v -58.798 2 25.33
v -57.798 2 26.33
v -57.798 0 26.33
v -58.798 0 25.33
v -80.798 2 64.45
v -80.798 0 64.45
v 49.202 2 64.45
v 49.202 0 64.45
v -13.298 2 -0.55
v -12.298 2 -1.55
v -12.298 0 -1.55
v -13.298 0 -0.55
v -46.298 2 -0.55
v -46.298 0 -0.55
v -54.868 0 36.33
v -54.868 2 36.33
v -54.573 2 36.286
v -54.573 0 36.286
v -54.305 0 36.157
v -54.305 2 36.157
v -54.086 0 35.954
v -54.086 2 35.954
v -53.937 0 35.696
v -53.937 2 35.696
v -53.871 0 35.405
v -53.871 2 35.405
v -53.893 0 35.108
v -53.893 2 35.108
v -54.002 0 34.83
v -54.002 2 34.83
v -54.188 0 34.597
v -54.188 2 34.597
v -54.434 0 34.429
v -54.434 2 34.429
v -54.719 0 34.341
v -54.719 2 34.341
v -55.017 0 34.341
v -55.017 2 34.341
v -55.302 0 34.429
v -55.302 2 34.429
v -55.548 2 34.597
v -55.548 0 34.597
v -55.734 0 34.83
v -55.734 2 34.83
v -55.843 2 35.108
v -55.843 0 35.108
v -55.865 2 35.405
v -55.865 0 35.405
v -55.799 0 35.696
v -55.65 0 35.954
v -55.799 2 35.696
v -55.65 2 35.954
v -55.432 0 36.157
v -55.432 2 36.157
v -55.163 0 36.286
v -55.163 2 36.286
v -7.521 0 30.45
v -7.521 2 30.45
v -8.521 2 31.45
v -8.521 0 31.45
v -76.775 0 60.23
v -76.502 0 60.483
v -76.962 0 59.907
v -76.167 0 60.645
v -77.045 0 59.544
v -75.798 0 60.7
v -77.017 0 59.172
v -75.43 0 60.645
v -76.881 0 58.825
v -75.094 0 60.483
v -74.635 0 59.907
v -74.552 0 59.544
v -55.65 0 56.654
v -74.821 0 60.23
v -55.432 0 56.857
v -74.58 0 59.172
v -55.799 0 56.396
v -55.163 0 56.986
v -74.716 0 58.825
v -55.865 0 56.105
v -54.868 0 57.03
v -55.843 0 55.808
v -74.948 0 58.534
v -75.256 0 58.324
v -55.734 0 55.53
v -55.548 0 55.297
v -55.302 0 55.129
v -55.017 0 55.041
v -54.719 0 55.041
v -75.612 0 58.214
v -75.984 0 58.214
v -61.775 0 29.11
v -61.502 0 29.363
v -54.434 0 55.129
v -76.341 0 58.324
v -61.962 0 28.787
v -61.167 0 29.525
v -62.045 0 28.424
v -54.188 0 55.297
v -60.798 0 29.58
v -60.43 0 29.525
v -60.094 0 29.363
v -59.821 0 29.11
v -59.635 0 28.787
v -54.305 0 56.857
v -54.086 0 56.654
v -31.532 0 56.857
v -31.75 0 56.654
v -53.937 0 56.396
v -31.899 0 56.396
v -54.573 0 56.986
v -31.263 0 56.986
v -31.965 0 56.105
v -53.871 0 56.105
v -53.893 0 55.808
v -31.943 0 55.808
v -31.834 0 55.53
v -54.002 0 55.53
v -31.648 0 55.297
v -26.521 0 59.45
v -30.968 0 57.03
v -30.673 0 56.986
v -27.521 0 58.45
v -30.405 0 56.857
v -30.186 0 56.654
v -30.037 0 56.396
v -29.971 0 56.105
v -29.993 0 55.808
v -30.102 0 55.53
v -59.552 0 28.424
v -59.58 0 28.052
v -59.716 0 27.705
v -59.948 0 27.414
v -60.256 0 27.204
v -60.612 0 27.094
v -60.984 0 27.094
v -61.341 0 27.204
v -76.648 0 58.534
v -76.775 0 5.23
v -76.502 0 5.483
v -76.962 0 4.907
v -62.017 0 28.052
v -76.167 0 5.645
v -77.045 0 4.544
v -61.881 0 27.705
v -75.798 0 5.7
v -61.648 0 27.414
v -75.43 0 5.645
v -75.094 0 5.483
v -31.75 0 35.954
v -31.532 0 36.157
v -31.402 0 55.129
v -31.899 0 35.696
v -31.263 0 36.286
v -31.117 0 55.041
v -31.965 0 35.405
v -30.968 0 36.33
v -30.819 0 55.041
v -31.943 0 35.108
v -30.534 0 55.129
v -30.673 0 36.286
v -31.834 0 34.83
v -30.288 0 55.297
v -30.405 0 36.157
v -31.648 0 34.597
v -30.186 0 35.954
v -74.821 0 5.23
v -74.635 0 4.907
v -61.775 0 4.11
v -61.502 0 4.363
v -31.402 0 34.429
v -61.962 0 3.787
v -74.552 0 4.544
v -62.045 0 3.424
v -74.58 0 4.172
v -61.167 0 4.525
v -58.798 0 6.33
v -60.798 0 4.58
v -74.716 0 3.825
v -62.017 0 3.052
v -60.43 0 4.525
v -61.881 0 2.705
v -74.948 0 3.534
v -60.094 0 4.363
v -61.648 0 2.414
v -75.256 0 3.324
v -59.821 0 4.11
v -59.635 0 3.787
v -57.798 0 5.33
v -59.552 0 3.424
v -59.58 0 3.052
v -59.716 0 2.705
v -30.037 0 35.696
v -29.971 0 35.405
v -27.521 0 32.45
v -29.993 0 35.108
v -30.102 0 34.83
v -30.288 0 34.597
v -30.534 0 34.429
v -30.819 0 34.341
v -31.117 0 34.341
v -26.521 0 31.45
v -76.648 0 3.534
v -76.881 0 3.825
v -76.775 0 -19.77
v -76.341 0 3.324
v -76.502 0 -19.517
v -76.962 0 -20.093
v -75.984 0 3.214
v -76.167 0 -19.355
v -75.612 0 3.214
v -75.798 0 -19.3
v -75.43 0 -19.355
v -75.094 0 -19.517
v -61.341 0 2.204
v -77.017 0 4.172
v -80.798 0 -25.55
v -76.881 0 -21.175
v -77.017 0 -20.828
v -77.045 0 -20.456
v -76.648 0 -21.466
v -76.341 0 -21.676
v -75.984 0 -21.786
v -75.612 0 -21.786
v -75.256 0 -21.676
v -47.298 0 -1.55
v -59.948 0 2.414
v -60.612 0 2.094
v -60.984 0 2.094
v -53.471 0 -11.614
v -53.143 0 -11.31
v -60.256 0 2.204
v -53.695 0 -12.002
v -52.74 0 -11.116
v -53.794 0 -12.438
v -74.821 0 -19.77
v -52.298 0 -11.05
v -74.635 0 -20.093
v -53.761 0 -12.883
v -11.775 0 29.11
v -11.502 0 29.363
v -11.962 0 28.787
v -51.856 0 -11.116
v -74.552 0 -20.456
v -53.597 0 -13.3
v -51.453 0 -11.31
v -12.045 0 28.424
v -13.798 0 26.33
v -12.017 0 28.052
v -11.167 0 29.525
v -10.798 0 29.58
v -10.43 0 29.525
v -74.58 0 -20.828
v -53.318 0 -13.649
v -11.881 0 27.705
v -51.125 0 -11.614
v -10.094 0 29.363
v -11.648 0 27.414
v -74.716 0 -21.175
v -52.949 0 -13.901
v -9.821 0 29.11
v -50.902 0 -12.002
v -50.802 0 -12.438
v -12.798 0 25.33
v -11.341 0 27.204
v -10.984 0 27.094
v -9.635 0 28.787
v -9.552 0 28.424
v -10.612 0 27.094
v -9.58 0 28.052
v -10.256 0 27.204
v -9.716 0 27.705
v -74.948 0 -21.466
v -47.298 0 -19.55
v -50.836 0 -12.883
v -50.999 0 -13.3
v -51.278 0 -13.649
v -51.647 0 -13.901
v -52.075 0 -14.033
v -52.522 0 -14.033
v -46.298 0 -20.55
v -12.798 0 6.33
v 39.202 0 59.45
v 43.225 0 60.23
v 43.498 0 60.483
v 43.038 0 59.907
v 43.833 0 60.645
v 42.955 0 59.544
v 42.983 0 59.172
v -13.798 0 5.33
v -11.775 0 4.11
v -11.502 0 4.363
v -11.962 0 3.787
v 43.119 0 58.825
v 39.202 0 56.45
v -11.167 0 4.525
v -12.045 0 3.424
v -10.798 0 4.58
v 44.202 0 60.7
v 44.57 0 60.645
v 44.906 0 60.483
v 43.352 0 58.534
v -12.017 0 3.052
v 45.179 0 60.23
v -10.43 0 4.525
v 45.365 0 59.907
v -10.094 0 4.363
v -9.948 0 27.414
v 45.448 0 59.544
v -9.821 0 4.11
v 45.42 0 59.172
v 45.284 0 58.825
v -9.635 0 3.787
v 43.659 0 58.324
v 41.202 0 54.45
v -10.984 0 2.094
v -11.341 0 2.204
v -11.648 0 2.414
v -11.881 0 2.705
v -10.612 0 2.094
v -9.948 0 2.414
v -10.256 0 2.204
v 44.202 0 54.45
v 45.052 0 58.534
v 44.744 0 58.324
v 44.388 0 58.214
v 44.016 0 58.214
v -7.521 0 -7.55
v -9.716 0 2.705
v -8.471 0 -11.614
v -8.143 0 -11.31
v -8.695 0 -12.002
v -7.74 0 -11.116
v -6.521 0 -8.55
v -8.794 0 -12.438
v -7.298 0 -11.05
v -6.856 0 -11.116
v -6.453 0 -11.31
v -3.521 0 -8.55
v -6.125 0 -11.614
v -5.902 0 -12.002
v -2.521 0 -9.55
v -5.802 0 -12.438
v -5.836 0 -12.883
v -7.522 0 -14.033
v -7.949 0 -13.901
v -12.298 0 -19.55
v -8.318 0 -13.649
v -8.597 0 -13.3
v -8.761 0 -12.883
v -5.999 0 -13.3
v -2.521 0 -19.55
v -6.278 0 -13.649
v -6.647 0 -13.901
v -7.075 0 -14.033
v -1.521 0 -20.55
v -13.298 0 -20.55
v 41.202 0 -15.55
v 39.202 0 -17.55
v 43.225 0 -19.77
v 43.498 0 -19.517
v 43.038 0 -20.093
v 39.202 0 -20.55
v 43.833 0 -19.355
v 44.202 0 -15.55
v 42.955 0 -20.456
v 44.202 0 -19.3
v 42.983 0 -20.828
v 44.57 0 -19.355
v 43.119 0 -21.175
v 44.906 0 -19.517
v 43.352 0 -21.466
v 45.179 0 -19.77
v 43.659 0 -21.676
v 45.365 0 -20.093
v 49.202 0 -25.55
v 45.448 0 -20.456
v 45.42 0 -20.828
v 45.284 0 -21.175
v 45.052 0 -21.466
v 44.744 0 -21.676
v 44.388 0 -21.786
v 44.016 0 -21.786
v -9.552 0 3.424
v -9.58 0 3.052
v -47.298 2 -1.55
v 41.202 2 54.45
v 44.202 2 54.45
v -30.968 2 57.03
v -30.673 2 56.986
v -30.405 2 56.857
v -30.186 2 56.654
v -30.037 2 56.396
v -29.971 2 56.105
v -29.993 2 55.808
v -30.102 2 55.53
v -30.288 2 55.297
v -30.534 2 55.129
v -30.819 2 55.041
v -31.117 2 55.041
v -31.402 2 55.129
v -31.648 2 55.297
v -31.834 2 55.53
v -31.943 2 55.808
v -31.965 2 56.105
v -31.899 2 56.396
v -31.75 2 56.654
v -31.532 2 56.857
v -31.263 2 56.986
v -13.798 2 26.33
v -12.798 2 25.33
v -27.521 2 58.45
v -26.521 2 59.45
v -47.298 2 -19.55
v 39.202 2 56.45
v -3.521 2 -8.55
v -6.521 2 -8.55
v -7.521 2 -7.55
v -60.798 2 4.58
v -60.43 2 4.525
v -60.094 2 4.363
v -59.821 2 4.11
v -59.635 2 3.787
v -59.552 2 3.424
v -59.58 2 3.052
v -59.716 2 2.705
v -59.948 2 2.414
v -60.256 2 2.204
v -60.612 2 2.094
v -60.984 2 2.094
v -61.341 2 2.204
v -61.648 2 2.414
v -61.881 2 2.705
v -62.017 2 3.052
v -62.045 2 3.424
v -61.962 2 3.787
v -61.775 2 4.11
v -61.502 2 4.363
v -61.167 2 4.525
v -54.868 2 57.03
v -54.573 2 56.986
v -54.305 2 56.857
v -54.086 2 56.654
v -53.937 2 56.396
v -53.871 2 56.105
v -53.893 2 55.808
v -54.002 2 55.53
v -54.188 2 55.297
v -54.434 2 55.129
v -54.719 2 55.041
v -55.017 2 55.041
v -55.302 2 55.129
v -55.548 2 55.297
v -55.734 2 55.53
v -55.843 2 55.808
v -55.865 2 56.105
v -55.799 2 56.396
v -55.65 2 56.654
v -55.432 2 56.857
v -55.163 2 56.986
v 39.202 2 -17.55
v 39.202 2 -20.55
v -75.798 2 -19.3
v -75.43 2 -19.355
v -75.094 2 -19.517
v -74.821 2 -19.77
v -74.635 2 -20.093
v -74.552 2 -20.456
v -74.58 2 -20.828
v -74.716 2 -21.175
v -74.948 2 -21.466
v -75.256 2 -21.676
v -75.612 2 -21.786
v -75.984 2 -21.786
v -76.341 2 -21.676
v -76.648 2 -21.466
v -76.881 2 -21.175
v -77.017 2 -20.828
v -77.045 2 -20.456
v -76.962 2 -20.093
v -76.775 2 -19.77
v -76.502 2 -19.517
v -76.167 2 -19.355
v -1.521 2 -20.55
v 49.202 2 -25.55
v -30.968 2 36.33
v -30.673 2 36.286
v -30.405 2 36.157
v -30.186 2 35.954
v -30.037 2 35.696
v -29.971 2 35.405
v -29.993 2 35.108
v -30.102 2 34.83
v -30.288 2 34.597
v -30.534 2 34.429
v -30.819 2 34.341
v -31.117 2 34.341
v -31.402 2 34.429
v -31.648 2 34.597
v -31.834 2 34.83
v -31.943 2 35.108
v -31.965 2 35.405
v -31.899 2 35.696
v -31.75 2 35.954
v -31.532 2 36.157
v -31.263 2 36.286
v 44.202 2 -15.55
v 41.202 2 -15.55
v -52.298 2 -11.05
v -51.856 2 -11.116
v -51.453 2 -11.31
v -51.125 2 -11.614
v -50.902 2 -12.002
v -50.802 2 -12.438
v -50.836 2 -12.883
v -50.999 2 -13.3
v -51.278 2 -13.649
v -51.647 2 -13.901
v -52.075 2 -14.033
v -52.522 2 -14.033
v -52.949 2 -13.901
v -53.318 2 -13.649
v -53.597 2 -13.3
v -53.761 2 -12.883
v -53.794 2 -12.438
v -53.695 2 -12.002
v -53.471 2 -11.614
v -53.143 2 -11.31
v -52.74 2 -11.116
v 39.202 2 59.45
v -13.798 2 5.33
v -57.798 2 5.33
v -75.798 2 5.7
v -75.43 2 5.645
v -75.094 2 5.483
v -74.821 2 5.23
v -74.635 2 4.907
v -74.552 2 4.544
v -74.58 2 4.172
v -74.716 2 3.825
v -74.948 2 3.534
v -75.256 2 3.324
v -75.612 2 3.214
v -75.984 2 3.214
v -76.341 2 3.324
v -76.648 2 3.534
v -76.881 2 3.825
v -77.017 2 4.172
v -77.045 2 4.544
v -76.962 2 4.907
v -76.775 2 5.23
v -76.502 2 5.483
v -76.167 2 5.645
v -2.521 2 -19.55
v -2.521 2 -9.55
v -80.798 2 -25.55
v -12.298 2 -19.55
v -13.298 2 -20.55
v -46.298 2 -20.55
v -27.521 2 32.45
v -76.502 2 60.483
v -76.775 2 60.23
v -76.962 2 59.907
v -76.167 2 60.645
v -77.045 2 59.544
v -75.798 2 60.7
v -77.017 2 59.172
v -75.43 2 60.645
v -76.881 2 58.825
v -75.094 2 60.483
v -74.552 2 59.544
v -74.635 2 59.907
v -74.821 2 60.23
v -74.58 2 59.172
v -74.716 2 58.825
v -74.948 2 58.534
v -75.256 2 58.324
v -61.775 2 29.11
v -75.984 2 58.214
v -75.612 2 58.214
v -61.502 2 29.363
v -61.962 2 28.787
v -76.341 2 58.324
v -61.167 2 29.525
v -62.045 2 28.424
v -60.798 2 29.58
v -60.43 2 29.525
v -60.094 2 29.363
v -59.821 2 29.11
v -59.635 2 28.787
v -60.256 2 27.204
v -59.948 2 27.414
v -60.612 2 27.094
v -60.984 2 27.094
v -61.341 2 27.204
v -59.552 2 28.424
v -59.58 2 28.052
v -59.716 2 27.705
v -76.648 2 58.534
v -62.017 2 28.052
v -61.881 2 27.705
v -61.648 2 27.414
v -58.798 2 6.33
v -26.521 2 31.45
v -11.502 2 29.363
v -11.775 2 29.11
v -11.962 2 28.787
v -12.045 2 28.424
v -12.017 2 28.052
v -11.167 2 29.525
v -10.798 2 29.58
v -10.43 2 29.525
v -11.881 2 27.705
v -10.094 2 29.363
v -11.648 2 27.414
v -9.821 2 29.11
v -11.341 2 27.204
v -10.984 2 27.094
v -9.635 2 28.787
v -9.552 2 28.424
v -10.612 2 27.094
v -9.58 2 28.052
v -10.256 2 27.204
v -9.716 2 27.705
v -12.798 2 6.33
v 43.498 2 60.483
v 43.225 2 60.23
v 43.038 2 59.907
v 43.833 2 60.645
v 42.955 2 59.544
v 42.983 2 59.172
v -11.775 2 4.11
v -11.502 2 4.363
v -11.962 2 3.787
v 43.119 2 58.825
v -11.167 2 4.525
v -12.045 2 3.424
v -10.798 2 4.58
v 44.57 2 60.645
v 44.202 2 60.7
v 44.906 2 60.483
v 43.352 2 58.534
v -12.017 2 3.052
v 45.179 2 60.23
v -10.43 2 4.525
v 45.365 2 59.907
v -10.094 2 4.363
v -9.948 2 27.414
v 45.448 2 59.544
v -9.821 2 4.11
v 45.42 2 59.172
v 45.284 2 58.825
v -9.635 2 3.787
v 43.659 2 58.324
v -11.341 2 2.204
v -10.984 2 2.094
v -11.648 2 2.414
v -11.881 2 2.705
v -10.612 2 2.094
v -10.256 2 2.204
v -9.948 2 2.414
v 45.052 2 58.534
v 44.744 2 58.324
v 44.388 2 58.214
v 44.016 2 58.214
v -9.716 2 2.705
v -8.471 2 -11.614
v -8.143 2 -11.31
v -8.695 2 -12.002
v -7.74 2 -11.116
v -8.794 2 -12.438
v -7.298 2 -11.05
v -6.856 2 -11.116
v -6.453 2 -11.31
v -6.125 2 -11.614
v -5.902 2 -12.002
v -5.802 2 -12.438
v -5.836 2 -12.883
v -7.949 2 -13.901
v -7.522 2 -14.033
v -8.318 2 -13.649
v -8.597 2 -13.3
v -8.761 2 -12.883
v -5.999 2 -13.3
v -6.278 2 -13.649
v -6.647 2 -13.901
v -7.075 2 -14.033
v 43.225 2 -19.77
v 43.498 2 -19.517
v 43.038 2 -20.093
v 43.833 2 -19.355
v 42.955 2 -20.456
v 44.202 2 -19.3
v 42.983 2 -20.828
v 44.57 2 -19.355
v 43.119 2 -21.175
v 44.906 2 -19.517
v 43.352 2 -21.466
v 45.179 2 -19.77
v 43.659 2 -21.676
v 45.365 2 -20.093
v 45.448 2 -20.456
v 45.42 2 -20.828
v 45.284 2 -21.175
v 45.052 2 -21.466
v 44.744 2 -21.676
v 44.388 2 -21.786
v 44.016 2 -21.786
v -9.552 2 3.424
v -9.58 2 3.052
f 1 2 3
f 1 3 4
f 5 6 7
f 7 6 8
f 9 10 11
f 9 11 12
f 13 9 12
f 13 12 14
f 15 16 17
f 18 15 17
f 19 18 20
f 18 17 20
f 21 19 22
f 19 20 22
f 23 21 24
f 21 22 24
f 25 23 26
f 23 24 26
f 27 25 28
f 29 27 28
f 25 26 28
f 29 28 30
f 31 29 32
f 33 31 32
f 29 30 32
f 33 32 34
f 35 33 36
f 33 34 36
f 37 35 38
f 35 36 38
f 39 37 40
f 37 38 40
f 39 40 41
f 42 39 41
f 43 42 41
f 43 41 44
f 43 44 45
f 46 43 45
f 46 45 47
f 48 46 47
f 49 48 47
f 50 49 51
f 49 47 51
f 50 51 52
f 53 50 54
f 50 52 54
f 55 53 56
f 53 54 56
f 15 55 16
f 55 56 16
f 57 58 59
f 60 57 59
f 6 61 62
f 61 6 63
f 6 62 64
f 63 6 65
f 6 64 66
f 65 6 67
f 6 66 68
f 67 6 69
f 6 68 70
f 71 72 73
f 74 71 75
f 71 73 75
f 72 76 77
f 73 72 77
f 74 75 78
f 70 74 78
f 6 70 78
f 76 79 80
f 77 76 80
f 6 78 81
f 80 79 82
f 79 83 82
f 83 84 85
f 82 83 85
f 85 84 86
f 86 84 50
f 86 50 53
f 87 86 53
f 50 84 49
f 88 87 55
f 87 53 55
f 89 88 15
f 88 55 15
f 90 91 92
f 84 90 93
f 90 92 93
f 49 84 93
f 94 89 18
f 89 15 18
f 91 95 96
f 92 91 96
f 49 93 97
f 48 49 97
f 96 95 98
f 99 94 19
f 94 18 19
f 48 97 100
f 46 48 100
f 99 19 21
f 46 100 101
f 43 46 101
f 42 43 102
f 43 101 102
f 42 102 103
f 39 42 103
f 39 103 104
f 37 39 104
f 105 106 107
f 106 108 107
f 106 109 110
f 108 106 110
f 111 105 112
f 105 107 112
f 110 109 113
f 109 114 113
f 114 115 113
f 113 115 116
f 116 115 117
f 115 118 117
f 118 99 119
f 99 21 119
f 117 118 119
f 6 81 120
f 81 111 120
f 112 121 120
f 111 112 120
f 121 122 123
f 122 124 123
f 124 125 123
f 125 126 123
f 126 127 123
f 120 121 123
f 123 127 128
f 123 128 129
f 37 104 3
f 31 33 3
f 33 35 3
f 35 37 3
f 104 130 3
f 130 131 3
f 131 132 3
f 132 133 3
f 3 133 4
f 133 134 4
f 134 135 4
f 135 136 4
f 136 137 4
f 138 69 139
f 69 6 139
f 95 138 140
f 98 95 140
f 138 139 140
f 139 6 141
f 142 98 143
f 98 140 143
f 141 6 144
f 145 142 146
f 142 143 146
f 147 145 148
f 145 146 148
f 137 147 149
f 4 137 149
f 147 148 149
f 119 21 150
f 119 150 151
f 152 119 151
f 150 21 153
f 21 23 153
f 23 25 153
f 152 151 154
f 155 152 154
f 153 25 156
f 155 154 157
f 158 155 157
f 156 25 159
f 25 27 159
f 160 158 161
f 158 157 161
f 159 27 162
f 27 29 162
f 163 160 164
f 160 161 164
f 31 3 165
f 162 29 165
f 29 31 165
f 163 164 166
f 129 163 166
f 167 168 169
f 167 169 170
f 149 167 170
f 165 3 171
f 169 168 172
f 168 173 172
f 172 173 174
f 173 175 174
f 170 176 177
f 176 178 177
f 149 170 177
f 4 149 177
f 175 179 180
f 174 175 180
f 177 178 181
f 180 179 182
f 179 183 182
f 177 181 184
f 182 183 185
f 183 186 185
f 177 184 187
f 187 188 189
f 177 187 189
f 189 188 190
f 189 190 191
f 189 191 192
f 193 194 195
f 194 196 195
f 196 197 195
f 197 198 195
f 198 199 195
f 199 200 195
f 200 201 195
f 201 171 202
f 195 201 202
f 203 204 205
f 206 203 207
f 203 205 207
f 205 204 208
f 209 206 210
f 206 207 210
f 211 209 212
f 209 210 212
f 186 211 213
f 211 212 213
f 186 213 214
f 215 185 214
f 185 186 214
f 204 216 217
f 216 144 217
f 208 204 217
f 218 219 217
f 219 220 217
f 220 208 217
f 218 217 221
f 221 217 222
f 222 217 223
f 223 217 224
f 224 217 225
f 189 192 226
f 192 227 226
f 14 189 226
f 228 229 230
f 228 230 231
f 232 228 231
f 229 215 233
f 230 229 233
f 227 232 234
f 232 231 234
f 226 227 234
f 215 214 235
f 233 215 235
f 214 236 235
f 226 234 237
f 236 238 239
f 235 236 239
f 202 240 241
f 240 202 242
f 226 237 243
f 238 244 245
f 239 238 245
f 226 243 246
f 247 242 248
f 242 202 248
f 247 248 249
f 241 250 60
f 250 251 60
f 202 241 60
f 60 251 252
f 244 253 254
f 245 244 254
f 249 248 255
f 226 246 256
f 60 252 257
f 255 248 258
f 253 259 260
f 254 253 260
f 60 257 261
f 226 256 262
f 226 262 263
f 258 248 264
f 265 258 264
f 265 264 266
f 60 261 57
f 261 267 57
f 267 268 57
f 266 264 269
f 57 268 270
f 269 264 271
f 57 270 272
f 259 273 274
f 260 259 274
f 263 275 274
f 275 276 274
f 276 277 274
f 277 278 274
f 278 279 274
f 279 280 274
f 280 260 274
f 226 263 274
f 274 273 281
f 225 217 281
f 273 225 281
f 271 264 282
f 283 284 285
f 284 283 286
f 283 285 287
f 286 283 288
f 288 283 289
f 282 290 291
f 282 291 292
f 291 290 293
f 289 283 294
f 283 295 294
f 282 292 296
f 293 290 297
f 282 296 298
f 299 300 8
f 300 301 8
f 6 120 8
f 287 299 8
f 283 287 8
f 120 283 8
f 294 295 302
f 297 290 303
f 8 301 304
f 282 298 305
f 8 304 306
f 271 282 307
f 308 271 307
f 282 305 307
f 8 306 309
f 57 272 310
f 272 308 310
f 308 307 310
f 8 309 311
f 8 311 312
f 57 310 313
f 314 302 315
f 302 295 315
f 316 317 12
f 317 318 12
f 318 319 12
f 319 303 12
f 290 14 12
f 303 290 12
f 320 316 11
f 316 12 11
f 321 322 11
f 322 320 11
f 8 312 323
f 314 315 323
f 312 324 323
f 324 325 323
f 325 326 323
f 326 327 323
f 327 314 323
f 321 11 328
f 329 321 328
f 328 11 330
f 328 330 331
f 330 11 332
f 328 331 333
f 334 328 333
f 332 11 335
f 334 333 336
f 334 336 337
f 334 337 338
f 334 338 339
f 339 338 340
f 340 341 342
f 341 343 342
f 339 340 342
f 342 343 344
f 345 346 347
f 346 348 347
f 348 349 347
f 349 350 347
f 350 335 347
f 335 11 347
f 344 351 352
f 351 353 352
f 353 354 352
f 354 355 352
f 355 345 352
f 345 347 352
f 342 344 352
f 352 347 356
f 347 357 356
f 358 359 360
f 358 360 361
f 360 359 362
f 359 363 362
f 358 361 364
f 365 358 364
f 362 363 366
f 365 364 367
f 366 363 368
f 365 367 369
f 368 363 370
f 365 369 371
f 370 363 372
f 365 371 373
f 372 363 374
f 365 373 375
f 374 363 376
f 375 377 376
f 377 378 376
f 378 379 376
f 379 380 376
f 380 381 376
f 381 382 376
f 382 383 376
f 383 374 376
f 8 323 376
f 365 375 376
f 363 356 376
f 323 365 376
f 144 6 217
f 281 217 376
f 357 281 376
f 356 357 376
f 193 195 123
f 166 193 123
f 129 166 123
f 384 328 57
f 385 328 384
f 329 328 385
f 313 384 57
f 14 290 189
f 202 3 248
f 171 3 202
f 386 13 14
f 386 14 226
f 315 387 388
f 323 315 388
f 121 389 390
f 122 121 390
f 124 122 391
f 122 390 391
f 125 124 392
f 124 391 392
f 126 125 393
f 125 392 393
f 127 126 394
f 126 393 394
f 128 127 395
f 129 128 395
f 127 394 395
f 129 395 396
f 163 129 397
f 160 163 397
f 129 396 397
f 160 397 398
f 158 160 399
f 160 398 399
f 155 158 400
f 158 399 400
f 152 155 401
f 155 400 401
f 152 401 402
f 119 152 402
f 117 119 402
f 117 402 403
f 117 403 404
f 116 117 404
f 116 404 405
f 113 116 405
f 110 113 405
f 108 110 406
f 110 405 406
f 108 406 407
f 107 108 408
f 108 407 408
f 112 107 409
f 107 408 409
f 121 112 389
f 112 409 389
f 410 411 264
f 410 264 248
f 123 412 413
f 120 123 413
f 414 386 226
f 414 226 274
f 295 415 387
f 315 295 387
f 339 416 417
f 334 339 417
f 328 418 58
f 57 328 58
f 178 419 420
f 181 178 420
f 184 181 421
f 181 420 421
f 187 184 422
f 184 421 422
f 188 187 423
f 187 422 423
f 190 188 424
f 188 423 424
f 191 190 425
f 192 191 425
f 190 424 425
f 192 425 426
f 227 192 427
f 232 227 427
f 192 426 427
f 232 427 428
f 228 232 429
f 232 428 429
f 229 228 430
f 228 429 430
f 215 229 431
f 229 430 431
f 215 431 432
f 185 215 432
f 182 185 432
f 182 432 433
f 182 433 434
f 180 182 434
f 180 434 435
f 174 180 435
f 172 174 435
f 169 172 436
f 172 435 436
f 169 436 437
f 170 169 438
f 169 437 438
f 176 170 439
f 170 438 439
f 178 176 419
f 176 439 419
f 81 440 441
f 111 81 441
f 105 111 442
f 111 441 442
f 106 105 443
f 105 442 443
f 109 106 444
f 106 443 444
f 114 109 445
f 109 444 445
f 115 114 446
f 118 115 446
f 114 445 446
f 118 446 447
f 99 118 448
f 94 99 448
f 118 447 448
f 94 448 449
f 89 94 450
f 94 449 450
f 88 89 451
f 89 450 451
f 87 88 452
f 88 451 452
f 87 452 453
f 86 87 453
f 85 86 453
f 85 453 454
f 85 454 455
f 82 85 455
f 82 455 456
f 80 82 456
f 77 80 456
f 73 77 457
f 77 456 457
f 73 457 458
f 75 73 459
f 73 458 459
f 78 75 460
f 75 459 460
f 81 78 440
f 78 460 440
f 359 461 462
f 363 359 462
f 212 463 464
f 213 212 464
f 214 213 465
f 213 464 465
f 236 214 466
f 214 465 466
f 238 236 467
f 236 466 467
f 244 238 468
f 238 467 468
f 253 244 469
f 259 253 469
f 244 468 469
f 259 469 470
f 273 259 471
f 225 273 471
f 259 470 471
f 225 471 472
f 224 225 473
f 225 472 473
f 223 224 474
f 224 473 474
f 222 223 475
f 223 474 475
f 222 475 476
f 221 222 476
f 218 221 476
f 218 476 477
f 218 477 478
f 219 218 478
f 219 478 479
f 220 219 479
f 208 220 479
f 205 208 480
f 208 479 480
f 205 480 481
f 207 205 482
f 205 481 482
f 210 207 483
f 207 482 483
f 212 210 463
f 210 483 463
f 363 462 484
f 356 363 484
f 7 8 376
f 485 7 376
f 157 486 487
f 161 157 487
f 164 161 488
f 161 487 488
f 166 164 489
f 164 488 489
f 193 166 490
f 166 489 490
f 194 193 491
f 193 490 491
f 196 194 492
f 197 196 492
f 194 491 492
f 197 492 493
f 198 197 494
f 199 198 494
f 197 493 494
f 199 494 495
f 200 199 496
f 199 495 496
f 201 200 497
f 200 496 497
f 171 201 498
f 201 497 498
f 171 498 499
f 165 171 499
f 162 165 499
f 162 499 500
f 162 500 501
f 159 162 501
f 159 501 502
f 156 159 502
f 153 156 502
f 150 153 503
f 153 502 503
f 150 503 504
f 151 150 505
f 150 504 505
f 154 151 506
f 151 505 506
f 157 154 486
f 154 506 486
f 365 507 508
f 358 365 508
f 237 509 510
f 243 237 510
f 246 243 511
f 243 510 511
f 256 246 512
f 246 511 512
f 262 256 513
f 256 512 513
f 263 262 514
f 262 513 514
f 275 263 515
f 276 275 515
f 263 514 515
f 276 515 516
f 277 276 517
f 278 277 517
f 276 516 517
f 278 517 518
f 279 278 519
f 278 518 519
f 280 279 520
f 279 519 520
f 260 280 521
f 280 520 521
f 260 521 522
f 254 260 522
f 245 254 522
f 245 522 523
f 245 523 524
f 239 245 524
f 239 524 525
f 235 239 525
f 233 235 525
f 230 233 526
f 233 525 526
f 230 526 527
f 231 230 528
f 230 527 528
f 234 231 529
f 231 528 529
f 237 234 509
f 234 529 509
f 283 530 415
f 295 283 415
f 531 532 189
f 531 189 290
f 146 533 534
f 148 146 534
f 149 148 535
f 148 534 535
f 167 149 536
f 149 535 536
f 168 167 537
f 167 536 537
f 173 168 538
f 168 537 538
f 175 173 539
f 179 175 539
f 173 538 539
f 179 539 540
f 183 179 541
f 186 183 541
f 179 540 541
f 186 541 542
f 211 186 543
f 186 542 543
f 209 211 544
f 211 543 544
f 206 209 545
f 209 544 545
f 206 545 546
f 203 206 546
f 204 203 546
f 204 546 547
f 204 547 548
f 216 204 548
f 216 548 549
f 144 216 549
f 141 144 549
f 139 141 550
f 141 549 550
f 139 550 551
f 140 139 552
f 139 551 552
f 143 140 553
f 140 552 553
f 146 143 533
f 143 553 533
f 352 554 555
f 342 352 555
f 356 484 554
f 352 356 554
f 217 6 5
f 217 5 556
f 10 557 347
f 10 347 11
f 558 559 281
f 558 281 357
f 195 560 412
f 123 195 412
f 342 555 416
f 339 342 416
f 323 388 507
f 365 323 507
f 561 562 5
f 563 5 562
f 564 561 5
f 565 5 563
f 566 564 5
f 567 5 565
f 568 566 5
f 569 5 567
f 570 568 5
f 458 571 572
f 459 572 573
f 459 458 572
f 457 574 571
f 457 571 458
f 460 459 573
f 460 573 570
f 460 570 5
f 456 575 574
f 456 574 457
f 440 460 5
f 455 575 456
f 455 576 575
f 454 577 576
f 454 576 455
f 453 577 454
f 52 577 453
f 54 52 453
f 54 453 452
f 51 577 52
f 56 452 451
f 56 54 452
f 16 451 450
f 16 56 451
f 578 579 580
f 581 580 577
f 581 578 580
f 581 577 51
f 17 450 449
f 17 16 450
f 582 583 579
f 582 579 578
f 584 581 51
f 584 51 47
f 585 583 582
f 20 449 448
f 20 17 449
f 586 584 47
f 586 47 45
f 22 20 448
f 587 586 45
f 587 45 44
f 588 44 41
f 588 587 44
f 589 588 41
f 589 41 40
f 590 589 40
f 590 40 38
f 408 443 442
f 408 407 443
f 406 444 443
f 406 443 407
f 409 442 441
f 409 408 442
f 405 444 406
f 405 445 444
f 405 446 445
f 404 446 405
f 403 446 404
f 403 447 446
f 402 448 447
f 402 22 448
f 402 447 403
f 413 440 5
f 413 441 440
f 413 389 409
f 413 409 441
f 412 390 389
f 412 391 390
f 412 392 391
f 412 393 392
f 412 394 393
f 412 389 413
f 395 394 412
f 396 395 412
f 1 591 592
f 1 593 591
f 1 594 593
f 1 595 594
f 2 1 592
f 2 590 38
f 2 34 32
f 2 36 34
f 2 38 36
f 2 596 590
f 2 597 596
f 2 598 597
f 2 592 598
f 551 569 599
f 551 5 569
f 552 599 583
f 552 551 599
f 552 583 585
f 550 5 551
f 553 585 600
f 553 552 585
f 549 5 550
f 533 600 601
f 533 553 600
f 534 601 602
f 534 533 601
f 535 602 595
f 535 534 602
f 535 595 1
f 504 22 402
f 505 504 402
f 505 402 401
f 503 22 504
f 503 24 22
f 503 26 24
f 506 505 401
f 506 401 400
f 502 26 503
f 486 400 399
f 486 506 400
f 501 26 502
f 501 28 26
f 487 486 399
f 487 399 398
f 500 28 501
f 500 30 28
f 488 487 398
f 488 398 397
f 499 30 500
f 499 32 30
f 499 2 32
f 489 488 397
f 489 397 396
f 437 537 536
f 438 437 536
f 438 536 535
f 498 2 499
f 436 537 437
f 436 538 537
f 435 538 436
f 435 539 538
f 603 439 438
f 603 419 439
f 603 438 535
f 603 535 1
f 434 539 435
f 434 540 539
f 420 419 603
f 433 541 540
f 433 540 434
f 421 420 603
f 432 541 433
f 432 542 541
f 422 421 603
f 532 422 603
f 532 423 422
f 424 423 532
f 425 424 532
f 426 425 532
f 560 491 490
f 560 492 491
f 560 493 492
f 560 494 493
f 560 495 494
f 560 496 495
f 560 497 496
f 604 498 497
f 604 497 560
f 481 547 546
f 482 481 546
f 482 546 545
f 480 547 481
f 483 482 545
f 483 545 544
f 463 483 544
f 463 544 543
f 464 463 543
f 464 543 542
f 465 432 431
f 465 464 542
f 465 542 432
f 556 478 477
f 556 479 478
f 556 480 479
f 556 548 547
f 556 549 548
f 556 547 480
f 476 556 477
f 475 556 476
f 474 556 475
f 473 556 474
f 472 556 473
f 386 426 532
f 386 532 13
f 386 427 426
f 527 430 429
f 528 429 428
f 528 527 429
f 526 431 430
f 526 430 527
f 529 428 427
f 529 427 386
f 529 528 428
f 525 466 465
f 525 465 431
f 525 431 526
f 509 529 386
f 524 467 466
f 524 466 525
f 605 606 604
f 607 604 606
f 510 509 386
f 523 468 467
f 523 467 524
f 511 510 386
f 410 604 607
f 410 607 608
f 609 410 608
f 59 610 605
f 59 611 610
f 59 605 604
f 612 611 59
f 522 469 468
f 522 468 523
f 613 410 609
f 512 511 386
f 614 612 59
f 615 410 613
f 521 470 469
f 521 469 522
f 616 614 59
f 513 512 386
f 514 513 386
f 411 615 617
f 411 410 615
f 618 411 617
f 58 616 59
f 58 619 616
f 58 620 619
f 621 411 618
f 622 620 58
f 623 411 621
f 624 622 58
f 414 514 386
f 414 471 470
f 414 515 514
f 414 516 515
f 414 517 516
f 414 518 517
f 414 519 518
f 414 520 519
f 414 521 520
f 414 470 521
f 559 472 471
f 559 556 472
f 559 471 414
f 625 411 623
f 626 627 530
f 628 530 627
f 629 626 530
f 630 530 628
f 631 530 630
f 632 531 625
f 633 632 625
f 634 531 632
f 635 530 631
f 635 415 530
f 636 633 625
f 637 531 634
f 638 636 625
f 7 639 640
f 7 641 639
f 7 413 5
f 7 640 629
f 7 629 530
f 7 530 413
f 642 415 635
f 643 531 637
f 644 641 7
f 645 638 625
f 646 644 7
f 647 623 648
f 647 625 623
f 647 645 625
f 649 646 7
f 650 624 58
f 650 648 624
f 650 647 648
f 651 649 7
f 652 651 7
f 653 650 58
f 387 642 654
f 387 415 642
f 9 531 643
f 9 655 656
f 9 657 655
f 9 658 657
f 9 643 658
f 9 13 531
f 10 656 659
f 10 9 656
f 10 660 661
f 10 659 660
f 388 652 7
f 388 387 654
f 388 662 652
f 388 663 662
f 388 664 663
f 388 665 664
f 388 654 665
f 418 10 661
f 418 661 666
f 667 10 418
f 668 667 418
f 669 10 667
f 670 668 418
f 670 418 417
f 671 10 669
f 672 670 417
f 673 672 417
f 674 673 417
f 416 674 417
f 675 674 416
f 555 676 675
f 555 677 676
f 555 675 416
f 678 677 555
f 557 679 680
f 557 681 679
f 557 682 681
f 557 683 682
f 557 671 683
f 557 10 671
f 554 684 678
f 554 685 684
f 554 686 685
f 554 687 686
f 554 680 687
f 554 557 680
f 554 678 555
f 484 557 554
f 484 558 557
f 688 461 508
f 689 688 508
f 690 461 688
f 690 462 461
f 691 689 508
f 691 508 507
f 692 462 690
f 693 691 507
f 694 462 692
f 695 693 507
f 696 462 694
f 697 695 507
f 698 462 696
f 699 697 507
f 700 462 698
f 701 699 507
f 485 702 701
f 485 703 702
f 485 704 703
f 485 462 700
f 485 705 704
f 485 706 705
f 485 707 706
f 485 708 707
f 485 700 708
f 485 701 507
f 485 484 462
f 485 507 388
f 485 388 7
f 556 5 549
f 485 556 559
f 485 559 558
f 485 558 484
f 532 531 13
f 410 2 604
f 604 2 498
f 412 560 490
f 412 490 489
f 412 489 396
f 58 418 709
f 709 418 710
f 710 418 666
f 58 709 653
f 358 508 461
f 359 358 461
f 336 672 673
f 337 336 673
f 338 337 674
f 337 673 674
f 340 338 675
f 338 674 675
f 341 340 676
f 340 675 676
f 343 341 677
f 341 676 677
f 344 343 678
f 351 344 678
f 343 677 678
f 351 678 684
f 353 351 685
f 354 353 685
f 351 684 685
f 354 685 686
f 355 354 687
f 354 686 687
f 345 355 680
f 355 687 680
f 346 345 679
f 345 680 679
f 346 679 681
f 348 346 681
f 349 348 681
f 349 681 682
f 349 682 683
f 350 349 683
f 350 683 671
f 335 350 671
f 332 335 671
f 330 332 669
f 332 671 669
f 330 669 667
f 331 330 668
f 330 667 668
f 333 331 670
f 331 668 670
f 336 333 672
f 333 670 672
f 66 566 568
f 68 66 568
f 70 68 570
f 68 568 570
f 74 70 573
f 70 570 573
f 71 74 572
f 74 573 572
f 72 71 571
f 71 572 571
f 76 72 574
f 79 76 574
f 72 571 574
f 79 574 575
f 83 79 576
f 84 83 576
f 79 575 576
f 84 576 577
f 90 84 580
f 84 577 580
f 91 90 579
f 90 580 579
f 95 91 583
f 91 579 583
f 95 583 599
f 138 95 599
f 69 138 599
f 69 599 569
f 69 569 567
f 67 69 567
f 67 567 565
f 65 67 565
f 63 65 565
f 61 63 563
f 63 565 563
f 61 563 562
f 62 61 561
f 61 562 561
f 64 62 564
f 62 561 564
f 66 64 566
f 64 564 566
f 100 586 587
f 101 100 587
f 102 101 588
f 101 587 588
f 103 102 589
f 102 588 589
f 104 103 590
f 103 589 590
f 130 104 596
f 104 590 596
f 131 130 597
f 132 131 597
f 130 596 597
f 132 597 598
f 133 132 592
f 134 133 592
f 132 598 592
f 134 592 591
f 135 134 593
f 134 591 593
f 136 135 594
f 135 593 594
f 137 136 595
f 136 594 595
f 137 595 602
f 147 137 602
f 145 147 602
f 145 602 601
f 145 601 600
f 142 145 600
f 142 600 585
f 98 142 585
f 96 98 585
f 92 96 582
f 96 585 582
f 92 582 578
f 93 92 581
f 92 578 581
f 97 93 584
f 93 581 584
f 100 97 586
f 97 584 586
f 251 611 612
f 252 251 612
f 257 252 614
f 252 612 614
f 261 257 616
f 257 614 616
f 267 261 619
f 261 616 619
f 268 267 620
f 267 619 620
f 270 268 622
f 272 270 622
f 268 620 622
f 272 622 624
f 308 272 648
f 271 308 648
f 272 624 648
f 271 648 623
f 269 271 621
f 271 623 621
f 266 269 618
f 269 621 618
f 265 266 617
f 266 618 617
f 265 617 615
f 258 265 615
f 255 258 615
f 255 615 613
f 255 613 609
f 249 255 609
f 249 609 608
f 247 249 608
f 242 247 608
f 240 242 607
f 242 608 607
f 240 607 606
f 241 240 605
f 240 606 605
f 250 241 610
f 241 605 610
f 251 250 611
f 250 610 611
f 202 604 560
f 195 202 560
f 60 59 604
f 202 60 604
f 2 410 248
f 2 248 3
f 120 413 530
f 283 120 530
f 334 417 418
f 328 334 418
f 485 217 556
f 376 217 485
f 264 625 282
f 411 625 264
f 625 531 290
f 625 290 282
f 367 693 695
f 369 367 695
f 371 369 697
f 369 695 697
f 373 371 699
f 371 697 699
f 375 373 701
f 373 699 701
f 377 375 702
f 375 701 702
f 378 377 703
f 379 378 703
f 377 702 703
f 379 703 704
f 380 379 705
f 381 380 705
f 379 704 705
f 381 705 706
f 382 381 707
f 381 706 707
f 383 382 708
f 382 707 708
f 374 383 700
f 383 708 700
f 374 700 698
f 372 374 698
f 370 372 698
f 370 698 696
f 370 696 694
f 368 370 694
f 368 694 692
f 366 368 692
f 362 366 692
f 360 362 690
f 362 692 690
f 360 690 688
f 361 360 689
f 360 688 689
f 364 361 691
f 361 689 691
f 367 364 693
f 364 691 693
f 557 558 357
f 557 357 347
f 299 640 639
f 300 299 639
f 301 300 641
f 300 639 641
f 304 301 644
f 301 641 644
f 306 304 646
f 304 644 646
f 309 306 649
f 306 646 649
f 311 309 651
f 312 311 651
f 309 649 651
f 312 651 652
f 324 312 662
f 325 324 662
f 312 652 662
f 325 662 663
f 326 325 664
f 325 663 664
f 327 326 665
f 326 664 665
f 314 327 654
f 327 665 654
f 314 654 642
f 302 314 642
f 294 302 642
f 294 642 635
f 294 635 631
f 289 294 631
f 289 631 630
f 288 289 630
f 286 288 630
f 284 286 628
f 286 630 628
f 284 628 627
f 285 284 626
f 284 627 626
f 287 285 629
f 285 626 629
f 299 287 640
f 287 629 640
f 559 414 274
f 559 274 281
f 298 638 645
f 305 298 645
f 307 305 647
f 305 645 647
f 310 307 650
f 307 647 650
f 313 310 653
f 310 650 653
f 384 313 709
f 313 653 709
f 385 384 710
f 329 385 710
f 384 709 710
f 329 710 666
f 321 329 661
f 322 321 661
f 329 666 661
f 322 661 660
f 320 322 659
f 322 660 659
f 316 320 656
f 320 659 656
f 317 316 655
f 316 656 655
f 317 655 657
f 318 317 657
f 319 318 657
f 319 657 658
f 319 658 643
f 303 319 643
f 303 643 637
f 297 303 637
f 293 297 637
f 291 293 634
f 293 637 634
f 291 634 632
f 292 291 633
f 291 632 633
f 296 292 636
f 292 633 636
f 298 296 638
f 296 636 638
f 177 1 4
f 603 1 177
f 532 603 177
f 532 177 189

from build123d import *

# Parameters (mm, degrees)
ESQUISSE1_W             = 130
ESQUISSE1_H             = 90
BOSS_EXTRU_1_DEPTH      = 2
ESQUISSE2_R             = 1.5
ESQUISSE2_R_2           = 1.25
ESQUISSE2_R_3           = 1
ENL_V_MAT_EXTRU_1_DEPTH = 2
ENL_V_MAT_EXTRU_2_DEPTH = 10
ENL_V_MAT_EXTRU_3_DEPTH = 10
ENL_V_MAT_EXTRU_4_DEPTH = 10


with BuildPart() as part:
    # Esquisse1 → Boss.-Extru.1 (new body)
    with BuildSketch(Plane(origin=(0, 0, 0), x_dir=(1, 0, 0), z_dir=(0, 1, 0))):
        with Locations((-15.798192771, -19.450301205)):
            Rectangle(ESQUISSE1_W, ESQUISSE1_H)
    extrude(amount=BOSS_EXTRU_1_DEPTH)

    # Esquisse2 → Enlèv. mat.-Extru.1 (cut)
    with BuildSketch(Plane(origin=(0, 2, 0), x_dir=(1, 0, 0), z_dir=(0, 1, 0))):
        with Locations(Location((-52.298192771, 12.549698795, 0), (0, 0, 270))):  # turned: the seam where the file's is
            Circle(ESQUISSE2_R)
        with Locations(Location((-7.298192771, 12.549698795, 0), (0, 0, 270))):  # turned: the seam where the file's is
            Circle(ESQUISSE2_R)
        with Locations(Location((-60.798192771, -3.330301205, 0), (0, 0, 270))):  # turned: the seam where the file's is
            Circle(ESQUISSE2_R_2)
        with Locations(Location((-10.798192771, -3.330301205, 0), (0, 0, 270))):  # turned: the seam where the file's is
            Circle(ESQUISSE2_R_2)
        with Locations(Location((-10.798192771, -28.330301205, 0), (0, 0, 270))):  # turned: the seam where the file's is
            Circle(ESQUISSE2_R_2)
        with Locations(Location((-60.798192771, -28.330301205, 0), (0, 0, 270))):  # turned: the seam where the file's is
            Circle(ESQUISSE2_R_2)
        with Locations(Location((-54.868192771, -35.330301205, 0), (0, 0, 270))):  # turned: the seam where the file's is
            Circle(ESQUISSE2_R_3)
        with Locations(Location((-30.968192771, -35.330301205, 0), (0, 0, 270))):  # turned: the seam where the file's is
            Circle(ESQUISSE2_R_3)
        with Locations(Location((-30.968192771, -56.030301205, 0), (0, 0, 270))):  # turned: the seam where the file's is
            Circle(ESQUISSE2_R_3)
        with Locations(Location((-54.868192771, -56.030301205, 0), (0, 0, 270))):  # turned: the seam where the file's is
            Circle(ESQUISSE2_R_3)
        with Locations(Location((-75.798192771, -4.450301205, 0), (0, 0, 270))):  # turned: the seam where the file's is
            Circle(ESQUISSE2_R_2)
        with Locations(Location((-75.798192771, -59.450301205, 0), (0, 0, 270))):  # turned: the seam where the file's is
            Circle(ESQUISSE2_R_2)
        with Locations(Location((44.201807229, 20.549698795, 0), (0, 0, 270))):  # turned: the seam where the file's is
            Circle(ESQUISSE2_R_2)
        with Locations(Location((44.201807229, -59.450301205, 0), (0, 0, 270))):  # turned: the seam where the file's is
            Circle(ESQUISSE2_R_2)
        with Locations(Location((-75.798192771, 20.549698795, 0), (0, 0, 270))):  # turned: the seam where the file's is
            Circle(ESQUISSE2_R_2)
    extrude(amount=-ENL_V_MAT_EXTRU_1_DEPTH, mode=Mode.SUBTRACT)

    # Esquisse3 → Enlèv. mat.-Extru.2 (cut)
    with BuildSketch(Plane(origin=(0, 2, 0), x_dir=(1, 0, 0), z_dir=(0, 1, 0))):
        Polygon((39.201807229, 20.549698795), (-1.521135019, 20.549698795), (-2.521135019, 19.549698795), (-2.521135019, 9.549698795), (-3.521135019, 8.549698795), (-6.521135019, 8.549698795), (-7.521135019, 7.549698795), (-7.521135019, -30.450301205), (-8.521135019, -31.450301205), (-26.521135019, -31.450301205), (-27.521135019, -32.450301205), (-27.521135019, -58.450301205), (-26.521135019, -59.450301205), (39.201807229, -59.450301205), (39.201807229, -56.450301205), (41.201807229, -54.450301205), (44.201807229, -54.450301205), (44.201807229, 15.549698795), (41.201807229, 15.549698795), (39.201807229, 17.549698795), align=None)
    extrude(amount=-ENL_V_MAT_EXTRU_2_DEPTH, mode=Mode.SUBTRACT)

    # Esquisse4 → Enlèv. mat.-Extru.3 (cut)
    with BuildSketch(Plane(origin=(0, 2, 0), x_dir=(1, 0, 0), z_dir=(0, 1, 0))):
        Polygon((-58.798192771, -6.330301205), (-57.798192771, -5.330301205), (-13.798192771, -5.330301205), (-12.798192771, -6.330301205), (-12.798192771, -25.330301205), (-13.798192771, -26.330301205), (-57.798192771, -26.330301205), (-58.798192771, -25.330301205), align=None)
    extrude(amount=-ENL_V_MAT_EXTRU_3_DEPTH, mode=Mode.SUBTRACT)

    # Esquisse5 → Enlèv. mat.-Extru.4 (cut)
    with BuildSketch(Plane(origin=(0, 2, 0), x_dir=(1, 0, 0), z_dir=(0, 1, 0))):
        Polygon((-46.298192771, 20.549698795), (-13.298192771, 20.549698795), (-12.298192771, 19.549698795), (-12.298192771, 1.549698795), (-13.298192771, 0.549698795), (-46.298192771, 0.549698795), (-47.298192771, 1.549698795), (-47.298192771, 19.549698795), align=None)
    extrude(amount=-ENL_V_MAT_EXTRU_4_DEPTH, mode=Mode.SUBTRACT)


solid = part.part
